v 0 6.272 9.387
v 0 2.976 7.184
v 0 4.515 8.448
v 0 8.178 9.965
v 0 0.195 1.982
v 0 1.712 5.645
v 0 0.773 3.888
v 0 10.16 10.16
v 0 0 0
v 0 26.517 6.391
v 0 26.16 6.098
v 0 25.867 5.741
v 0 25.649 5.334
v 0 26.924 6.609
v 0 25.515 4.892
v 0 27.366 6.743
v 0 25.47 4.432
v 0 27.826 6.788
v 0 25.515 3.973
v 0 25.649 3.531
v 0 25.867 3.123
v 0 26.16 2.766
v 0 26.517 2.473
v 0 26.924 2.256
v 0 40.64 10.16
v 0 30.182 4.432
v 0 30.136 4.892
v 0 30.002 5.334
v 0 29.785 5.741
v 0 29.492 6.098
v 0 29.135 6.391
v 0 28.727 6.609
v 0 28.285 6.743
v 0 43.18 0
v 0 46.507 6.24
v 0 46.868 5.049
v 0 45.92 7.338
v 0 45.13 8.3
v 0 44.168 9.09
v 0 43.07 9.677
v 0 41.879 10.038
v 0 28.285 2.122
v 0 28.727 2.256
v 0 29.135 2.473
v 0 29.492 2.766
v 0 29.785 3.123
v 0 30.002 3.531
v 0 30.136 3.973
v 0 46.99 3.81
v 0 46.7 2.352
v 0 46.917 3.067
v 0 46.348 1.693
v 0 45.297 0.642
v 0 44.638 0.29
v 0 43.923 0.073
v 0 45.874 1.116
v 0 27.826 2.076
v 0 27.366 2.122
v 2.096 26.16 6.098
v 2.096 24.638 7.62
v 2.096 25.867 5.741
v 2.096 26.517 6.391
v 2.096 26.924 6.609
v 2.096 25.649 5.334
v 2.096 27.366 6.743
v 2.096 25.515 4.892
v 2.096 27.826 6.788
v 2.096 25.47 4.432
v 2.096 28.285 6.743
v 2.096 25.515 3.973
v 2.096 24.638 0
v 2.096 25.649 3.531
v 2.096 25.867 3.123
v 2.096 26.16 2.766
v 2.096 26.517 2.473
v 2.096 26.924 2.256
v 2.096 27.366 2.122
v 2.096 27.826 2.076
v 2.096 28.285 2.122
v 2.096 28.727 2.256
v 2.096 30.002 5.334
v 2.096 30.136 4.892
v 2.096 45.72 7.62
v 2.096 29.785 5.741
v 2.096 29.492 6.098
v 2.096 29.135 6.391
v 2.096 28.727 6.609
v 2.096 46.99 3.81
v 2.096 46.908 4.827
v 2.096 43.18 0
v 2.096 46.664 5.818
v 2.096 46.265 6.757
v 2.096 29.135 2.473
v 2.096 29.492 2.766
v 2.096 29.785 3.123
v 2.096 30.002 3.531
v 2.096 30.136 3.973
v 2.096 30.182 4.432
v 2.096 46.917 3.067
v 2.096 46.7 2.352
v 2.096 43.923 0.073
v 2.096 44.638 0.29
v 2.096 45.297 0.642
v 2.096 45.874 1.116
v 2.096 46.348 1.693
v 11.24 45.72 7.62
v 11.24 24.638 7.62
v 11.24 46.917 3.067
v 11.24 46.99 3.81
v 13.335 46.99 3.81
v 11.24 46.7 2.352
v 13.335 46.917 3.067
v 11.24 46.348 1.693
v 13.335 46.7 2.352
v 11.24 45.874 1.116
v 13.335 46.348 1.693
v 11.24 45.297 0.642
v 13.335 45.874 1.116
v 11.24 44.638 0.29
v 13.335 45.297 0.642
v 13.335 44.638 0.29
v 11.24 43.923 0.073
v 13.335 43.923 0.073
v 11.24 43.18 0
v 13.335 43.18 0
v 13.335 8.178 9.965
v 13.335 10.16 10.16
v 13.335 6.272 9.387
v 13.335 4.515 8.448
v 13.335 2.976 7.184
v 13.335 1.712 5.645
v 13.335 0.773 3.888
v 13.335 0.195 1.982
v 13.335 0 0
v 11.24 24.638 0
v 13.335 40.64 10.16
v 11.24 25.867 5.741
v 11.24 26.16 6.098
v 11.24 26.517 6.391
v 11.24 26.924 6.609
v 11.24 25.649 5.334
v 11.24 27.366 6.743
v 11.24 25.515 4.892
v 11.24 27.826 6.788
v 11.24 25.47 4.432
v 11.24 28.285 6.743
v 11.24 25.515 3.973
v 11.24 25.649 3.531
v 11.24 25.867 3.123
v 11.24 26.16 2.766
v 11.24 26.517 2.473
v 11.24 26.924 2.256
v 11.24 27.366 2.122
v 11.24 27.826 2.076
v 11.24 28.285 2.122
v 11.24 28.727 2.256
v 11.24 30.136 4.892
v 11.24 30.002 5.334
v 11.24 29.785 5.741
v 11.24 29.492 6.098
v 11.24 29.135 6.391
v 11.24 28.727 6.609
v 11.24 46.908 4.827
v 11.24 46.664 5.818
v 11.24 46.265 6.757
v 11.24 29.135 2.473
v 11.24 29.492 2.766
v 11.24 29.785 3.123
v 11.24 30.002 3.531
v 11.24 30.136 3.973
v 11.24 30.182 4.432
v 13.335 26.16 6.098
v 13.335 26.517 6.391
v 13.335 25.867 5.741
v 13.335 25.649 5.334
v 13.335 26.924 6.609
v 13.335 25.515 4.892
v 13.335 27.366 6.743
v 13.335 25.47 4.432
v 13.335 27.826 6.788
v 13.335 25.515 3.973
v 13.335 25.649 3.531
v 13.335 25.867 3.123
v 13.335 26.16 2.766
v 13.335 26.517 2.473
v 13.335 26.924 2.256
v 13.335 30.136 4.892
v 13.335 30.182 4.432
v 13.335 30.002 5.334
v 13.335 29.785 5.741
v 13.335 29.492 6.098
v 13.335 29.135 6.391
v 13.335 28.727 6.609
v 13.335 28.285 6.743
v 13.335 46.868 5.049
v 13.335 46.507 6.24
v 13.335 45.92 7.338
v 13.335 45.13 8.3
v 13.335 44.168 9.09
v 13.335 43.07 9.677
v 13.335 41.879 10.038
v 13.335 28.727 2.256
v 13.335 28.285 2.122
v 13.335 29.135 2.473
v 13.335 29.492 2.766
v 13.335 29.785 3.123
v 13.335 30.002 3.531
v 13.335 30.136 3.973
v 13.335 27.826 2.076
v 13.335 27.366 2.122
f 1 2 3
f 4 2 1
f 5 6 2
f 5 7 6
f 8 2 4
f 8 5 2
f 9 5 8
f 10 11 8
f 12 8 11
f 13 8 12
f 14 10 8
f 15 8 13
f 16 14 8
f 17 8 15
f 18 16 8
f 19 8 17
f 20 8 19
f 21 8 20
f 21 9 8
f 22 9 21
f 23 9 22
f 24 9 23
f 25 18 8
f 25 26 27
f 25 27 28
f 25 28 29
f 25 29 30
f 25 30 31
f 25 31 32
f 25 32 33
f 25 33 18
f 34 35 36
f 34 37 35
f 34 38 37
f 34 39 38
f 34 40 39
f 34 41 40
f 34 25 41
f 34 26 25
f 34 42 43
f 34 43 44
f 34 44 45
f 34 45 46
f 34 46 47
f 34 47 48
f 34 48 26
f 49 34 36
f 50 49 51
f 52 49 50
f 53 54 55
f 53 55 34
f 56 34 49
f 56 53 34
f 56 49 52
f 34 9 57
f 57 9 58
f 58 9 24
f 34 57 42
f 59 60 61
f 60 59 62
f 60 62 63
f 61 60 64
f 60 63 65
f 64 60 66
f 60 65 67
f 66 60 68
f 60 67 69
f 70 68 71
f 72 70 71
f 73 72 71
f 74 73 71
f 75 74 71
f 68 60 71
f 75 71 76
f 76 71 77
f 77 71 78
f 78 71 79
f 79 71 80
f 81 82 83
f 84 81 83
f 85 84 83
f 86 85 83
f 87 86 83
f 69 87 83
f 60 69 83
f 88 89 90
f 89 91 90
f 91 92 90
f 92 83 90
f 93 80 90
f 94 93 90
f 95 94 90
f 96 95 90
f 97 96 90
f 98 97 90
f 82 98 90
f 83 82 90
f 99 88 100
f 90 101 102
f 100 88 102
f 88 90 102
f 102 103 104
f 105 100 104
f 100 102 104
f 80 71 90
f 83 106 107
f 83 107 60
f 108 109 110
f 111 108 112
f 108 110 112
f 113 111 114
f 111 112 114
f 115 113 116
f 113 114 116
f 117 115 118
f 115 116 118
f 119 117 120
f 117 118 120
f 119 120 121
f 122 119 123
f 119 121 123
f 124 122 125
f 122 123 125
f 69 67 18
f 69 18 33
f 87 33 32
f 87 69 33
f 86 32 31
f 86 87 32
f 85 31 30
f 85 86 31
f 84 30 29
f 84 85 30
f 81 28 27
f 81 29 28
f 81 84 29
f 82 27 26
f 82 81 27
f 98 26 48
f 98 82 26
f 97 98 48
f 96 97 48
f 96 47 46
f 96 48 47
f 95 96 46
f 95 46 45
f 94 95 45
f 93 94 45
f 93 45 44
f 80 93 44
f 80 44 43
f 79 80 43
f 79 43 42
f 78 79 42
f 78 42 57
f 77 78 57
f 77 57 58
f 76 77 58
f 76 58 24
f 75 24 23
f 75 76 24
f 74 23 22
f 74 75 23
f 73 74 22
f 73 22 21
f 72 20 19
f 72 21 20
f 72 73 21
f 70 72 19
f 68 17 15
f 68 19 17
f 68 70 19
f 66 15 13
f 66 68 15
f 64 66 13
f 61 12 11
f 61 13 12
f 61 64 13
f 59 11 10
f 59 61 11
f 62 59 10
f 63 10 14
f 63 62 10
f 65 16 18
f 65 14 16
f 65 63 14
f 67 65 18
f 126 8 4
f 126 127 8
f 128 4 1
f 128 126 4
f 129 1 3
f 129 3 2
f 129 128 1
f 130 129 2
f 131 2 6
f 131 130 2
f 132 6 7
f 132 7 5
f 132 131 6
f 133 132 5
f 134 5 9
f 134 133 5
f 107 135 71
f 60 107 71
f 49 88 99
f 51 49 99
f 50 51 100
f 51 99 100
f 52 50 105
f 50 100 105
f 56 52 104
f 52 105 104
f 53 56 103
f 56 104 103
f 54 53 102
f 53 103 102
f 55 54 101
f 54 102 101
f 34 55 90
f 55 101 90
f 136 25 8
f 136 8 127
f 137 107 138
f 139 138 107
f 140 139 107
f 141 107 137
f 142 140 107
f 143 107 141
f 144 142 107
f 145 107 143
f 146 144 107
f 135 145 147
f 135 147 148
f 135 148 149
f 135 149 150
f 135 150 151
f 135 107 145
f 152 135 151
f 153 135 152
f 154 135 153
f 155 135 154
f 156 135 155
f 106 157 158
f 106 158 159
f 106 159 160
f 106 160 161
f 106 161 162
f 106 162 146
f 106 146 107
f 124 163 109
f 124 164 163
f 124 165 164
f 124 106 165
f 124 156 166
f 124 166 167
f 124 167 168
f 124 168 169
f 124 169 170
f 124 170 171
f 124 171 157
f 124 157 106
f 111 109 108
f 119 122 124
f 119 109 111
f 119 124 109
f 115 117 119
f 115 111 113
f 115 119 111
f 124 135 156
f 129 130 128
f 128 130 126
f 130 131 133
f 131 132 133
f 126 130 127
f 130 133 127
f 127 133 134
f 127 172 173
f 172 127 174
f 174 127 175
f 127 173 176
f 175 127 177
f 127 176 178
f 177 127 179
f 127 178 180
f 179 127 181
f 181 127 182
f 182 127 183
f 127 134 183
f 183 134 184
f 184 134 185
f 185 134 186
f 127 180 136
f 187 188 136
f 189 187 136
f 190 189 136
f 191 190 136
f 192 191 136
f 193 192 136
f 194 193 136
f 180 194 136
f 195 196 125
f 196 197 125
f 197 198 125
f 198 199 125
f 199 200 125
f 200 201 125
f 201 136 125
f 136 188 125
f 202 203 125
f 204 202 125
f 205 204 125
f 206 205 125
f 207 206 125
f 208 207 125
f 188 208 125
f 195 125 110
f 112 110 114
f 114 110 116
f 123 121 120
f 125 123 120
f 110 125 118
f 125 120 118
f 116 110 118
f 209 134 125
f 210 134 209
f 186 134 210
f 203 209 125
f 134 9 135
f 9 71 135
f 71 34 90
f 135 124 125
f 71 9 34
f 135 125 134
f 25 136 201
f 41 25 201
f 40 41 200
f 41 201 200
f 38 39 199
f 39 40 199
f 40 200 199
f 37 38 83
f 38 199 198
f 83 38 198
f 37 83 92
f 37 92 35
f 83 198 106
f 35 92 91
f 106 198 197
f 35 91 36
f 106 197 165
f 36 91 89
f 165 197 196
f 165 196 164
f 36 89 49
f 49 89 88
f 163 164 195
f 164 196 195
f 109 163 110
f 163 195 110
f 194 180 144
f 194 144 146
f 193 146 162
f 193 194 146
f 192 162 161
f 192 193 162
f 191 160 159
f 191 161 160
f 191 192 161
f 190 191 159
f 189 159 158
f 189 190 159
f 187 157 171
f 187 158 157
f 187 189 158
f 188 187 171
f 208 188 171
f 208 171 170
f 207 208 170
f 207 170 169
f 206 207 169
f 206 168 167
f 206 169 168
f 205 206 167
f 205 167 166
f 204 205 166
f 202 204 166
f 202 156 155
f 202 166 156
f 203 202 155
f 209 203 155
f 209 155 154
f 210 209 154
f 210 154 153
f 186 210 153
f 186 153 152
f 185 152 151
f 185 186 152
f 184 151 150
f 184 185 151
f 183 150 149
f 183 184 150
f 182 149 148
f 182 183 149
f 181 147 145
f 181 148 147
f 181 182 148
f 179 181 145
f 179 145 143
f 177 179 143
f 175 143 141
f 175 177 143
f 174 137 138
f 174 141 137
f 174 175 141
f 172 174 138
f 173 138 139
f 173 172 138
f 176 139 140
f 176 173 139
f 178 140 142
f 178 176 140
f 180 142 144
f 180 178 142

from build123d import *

# Parameters (mm, degrees)
SKETCH1_W               = 13.335
SKETCH1_H               = 46.99
BOSS_EXTRUDE1_DEPTH     = 10.16
FILLET5_R               = 3.81
SKETCH2_W               = 9.144
SKETCH2_H               = 22.352
CUT_EXTRUDE1_DEPTH      = 7.62
CUT_EXTRUDE2_DEPTH      = 50.890960354
CUT_EXTRUDE2_DEPTH_BACK = 50.890960354
SKETCH3_R               = 2.35585
FILLET4_R               = 6.35
FILLET6_R               = 10.16


# Some blends are built 0.0001 mm under size
with BuildPart() as part:
    # Sketch1 → Boss-Extrude1 (new body)
    with BuildSketch(Plane.XY):
        with Locations((6.6675, 23.495)):
            Rectangle(SKETCH1_W, SKETCH1_H)
    extrude(amount=BOSS_EXTRUDE1_DEPTH)

    # Fillet5
    fillet5_edges = [part.edges().sort_by_distance(p)[0] for p in [
        (6.6675, 46.99, 0),
    ]]
    fillet(fillet5_edges, radius=FILLET5_R)

    # Sketch2 → Cut-Extrude1 (cut)
    with BuildSketch(Plane(origin=(0, 0, 0), x_dir=(-1, 0, 0), z_dir=(0, 0, -1))):
        with Locations((-6.6675, 35.814)):
            Rectangle(SKETCH2_W, SKETCH2_H)
    extrude(amount=-CUT_EXTRUDE1_DEPTH, mode=Mode.SUBTRACT)

    # Sketch3 → Cut-Extrude2 (cut, two sides: drawn at the far end of the back side and taken through both)
    with BuildSketch(Plane.ZY.offset(-CUT_EXTRUDE2_DEPTH_BACK)):
        with Locations((4.4323, 27.8257)):
            Circle(SKETCH3_R)
    extrude(amount=CUT_EXTRUDE2_DEPTH + CUT_EXTRUDE2_DEPTH_BACK, mode=Mode.SUBTRACT)

    # Fillet4
    # the kernel refuses this fillet: 6.35 mm, written as the material it takes off along each edge
    with BuildSketch(Plane(origin=(29.21, 46.99, 10.16), x_dir=(0, 0, -1), z_dir=(-1, 0, 0))) as fillet4_piece_1:
        with BuildLine():
            CenterArc((FILLET4_R, FILLET4_R), FILLET4_R, 180, 90)
            Line((0, FILLET4_R), (0, 0))
            Line((0, 0), (FILLET4_R, 0))
        make_face()
    extrude(amount=45.085, mode=Mode.SUBTRACT)

    # Fillet6
    fillet6_edges = [part.edges().sort_by_distance(p)[0] for p in [
        (6.6675, 0, 10.16),
    ]]
    fillet(fillet6_edges, radius=FILLET6_R - 0.0001)  # a hair under: the kernel refuses the full size


solid = part.part
